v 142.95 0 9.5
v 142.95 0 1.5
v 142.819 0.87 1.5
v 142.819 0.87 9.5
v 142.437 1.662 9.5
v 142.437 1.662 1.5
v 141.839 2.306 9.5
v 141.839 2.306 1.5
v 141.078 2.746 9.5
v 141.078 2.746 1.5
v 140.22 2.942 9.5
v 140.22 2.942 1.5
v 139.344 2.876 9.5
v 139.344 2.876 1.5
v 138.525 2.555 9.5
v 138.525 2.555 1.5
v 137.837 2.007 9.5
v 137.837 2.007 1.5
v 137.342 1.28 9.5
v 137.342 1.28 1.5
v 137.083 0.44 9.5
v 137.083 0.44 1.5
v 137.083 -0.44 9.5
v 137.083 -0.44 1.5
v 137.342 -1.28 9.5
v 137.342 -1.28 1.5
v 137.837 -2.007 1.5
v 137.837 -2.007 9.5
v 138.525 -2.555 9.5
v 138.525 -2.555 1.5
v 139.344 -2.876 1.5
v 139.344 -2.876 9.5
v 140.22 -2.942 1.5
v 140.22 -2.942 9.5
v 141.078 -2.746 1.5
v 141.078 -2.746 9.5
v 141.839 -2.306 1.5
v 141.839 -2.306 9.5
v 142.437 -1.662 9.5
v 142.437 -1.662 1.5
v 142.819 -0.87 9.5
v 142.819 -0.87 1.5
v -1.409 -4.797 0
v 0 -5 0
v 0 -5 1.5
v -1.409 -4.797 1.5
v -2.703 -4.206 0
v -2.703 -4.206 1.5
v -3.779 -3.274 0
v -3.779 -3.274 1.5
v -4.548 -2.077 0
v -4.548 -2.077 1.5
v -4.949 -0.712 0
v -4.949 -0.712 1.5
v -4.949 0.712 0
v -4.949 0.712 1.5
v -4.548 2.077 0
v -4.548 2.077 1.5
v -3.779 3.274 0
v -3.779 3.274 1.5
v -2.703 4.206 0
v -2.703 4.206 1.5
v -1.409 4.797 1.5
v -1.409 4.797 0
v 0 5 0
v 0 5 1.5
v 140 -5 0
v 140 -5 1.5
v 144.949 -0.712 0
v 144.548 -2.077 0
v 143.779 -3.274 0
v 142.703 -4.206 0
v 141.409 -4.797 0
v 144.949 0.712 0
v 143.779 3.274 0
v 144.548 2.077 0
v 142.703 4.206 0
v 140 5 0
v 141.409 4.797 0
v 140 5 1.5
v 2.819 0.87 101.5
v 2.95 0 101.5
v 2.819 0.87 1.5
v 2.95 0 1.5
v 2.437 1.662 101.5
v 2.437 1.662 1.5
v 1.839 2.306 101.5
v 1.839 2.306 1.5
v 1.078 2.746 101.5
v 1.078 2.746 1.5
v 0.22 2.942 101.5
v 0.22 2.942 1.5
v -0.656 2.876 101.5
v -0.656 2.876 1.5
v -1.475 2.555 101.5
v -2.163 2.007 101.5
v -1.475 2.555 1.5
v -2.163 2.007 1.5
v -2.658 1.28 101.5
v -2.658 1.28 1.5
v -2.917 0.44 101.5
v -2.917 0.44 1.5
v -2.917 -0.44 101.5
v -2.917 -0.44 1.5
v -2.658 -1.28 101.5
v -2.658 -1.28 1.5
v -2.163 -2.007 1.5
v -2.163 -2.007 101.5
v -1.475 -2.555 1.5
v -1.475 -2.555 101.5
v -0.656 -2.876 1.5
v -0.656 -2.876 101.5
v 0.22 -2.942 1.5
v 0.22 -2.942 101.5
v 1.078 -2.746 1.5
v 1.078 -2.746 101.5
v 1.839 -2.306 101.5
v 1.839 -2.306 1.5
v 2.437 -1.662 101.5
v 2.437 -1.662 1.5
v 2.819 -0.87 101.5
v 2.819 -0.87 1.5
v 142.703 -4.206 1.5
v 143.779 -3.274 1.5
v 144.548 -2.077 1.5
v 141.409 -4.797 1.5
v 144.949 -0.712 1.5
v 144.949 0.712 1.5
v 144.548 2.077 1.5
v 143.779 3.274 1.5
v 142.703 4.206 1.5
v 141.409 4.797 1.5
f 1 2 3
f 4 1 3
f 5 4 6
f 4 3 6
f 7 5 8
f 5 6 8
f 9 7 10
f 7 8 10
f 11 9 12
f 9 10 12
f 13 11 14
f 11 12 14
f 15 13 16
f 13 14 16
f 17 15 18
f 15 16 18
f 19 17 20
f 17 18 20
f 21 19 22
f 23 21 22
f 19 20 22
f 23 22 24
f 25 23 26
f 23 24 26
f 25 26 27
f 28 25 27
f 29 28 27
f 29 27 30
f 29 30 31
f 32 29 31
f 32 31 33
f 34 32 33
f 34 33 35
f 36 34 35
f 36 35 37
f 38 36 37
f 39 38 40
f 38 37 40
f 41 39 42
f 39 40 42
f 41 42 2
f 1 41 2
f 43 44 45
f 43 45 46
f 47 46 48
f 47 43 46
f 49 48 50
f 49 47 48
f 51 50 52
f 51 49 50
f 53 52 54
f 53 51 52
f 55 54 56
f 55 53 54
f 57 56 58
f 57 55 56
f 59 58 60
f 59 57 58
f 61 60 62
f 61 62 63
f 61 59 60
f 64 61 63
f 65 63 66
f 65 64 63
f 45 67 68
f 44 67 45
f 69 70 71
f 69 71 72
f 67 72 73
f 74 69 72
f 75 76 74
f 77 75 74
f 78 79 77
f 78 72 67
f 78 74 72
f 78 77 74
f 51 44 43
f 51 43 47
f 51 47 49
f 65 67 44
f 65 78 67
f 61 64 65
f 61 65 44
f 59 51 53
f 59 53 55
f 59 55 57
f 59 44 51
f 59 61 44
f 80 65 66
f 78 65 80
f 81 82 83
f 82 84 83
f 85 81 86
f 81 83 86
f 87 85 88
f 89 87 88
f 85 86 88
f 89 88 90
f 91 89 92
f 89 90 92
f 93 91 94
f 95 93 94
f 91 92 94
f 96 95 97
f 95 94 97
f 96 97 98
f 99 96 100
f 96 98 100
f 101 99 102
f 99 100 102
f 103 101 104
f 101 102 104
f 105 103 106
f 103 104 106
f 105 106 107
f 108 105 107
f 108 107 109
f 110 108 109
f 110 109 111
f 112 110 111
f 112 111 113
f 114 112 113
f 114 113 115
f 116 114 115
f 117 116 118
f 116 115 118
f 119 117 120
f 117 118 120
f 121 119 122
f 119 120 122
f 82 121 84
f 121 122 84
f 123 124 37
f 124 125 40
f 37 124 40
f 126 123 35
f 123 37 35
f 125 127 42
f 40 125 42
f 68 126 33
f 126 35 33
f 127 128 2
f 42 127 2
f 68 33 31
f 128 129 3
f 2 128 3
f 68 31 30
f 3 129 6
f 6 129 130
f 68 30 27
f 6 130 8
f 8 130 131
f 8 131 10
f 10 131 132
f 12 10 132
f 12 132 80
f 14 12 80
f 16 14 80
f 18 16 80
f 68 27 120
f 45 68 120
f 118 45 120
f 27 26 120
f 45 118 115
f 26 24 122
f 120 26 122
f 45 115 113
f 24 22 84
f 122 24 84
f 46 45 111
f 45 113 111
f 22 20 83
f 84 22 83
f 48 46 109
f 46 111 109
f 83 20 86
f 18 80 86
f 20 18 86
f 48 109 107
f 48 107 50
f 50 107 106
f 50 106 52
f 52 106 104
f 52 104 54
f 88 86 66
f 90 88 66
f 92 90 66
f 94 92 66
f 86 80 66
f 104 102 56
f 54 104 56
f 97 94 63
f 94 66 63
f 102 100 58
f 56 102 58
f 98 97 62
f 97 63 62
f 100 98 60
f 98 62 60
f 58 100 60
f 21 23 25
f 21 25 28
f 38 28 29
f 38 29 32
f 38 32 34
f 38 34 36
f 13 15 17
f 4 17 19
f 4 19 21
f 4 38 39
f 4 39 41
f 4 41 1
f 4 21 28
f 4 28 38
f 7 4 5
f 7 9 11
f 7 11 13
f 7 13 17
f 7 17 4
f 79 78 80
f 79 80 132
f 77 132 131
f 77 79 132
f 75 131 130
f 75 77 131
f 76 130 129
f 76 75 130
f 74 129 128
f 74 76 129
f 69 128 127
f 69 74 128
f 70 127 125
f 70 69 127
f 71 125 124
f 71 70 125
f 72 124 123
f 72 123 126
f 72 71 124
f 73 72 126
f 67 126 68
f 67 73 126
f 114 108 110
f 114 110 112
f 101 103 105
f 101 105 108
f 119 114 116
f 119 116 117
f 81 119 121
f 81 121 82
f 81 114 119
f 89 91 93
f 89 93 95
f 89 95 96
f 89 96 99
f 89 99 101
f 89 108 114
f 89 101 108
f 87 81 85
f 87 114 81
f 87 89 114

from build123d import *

# Parameters (mm, degrees)
BOSS_EXTRUDE1_DEPTH = 1.5
SKETCH2_R           = 2.95
BOSS_EXTRUDE2_DEPTH = 8
SKETCH3_R           = 2.95
BOSS_EXTRUDE3_DEPTH = 92


with BuildPart() as part:
    # Sketch1 → Boss-Extrude1 (new body)
    with BuildSketch(Plane.XY):
        with BuildLine():
            Line((0, 5), (140, 5))
            ThreePointArc((140, 5), (145, 0), (140, -5))
            Line((140, -5), (0, -5))
            ThreePointArc((0, -5), (-5, 0), (0, 5))
        make_face()
    extrude(amount=BOSS_EXTRUDE1_DEPTH)

    # Sketch2 → Boss-Extrude2 (add)
    with BuildSketch(Plane.XY.offset(1.5)):
        Circle(SKETCH2_R)
        with Locations((140, 0)):
            Circle(SKETCH2_R)
    extrude(amount=BOSS_EXTRUDE2_DEPTH)

    # Sketch3 → Boss-Extrude3 (add)
    with BuildSketch(Plane.XY.offset(9.5)):
        Circle(SKETCH3_R)
    extrude(amount=BOSS_EXTRUDE3_DEPTH)


solid = part.part
